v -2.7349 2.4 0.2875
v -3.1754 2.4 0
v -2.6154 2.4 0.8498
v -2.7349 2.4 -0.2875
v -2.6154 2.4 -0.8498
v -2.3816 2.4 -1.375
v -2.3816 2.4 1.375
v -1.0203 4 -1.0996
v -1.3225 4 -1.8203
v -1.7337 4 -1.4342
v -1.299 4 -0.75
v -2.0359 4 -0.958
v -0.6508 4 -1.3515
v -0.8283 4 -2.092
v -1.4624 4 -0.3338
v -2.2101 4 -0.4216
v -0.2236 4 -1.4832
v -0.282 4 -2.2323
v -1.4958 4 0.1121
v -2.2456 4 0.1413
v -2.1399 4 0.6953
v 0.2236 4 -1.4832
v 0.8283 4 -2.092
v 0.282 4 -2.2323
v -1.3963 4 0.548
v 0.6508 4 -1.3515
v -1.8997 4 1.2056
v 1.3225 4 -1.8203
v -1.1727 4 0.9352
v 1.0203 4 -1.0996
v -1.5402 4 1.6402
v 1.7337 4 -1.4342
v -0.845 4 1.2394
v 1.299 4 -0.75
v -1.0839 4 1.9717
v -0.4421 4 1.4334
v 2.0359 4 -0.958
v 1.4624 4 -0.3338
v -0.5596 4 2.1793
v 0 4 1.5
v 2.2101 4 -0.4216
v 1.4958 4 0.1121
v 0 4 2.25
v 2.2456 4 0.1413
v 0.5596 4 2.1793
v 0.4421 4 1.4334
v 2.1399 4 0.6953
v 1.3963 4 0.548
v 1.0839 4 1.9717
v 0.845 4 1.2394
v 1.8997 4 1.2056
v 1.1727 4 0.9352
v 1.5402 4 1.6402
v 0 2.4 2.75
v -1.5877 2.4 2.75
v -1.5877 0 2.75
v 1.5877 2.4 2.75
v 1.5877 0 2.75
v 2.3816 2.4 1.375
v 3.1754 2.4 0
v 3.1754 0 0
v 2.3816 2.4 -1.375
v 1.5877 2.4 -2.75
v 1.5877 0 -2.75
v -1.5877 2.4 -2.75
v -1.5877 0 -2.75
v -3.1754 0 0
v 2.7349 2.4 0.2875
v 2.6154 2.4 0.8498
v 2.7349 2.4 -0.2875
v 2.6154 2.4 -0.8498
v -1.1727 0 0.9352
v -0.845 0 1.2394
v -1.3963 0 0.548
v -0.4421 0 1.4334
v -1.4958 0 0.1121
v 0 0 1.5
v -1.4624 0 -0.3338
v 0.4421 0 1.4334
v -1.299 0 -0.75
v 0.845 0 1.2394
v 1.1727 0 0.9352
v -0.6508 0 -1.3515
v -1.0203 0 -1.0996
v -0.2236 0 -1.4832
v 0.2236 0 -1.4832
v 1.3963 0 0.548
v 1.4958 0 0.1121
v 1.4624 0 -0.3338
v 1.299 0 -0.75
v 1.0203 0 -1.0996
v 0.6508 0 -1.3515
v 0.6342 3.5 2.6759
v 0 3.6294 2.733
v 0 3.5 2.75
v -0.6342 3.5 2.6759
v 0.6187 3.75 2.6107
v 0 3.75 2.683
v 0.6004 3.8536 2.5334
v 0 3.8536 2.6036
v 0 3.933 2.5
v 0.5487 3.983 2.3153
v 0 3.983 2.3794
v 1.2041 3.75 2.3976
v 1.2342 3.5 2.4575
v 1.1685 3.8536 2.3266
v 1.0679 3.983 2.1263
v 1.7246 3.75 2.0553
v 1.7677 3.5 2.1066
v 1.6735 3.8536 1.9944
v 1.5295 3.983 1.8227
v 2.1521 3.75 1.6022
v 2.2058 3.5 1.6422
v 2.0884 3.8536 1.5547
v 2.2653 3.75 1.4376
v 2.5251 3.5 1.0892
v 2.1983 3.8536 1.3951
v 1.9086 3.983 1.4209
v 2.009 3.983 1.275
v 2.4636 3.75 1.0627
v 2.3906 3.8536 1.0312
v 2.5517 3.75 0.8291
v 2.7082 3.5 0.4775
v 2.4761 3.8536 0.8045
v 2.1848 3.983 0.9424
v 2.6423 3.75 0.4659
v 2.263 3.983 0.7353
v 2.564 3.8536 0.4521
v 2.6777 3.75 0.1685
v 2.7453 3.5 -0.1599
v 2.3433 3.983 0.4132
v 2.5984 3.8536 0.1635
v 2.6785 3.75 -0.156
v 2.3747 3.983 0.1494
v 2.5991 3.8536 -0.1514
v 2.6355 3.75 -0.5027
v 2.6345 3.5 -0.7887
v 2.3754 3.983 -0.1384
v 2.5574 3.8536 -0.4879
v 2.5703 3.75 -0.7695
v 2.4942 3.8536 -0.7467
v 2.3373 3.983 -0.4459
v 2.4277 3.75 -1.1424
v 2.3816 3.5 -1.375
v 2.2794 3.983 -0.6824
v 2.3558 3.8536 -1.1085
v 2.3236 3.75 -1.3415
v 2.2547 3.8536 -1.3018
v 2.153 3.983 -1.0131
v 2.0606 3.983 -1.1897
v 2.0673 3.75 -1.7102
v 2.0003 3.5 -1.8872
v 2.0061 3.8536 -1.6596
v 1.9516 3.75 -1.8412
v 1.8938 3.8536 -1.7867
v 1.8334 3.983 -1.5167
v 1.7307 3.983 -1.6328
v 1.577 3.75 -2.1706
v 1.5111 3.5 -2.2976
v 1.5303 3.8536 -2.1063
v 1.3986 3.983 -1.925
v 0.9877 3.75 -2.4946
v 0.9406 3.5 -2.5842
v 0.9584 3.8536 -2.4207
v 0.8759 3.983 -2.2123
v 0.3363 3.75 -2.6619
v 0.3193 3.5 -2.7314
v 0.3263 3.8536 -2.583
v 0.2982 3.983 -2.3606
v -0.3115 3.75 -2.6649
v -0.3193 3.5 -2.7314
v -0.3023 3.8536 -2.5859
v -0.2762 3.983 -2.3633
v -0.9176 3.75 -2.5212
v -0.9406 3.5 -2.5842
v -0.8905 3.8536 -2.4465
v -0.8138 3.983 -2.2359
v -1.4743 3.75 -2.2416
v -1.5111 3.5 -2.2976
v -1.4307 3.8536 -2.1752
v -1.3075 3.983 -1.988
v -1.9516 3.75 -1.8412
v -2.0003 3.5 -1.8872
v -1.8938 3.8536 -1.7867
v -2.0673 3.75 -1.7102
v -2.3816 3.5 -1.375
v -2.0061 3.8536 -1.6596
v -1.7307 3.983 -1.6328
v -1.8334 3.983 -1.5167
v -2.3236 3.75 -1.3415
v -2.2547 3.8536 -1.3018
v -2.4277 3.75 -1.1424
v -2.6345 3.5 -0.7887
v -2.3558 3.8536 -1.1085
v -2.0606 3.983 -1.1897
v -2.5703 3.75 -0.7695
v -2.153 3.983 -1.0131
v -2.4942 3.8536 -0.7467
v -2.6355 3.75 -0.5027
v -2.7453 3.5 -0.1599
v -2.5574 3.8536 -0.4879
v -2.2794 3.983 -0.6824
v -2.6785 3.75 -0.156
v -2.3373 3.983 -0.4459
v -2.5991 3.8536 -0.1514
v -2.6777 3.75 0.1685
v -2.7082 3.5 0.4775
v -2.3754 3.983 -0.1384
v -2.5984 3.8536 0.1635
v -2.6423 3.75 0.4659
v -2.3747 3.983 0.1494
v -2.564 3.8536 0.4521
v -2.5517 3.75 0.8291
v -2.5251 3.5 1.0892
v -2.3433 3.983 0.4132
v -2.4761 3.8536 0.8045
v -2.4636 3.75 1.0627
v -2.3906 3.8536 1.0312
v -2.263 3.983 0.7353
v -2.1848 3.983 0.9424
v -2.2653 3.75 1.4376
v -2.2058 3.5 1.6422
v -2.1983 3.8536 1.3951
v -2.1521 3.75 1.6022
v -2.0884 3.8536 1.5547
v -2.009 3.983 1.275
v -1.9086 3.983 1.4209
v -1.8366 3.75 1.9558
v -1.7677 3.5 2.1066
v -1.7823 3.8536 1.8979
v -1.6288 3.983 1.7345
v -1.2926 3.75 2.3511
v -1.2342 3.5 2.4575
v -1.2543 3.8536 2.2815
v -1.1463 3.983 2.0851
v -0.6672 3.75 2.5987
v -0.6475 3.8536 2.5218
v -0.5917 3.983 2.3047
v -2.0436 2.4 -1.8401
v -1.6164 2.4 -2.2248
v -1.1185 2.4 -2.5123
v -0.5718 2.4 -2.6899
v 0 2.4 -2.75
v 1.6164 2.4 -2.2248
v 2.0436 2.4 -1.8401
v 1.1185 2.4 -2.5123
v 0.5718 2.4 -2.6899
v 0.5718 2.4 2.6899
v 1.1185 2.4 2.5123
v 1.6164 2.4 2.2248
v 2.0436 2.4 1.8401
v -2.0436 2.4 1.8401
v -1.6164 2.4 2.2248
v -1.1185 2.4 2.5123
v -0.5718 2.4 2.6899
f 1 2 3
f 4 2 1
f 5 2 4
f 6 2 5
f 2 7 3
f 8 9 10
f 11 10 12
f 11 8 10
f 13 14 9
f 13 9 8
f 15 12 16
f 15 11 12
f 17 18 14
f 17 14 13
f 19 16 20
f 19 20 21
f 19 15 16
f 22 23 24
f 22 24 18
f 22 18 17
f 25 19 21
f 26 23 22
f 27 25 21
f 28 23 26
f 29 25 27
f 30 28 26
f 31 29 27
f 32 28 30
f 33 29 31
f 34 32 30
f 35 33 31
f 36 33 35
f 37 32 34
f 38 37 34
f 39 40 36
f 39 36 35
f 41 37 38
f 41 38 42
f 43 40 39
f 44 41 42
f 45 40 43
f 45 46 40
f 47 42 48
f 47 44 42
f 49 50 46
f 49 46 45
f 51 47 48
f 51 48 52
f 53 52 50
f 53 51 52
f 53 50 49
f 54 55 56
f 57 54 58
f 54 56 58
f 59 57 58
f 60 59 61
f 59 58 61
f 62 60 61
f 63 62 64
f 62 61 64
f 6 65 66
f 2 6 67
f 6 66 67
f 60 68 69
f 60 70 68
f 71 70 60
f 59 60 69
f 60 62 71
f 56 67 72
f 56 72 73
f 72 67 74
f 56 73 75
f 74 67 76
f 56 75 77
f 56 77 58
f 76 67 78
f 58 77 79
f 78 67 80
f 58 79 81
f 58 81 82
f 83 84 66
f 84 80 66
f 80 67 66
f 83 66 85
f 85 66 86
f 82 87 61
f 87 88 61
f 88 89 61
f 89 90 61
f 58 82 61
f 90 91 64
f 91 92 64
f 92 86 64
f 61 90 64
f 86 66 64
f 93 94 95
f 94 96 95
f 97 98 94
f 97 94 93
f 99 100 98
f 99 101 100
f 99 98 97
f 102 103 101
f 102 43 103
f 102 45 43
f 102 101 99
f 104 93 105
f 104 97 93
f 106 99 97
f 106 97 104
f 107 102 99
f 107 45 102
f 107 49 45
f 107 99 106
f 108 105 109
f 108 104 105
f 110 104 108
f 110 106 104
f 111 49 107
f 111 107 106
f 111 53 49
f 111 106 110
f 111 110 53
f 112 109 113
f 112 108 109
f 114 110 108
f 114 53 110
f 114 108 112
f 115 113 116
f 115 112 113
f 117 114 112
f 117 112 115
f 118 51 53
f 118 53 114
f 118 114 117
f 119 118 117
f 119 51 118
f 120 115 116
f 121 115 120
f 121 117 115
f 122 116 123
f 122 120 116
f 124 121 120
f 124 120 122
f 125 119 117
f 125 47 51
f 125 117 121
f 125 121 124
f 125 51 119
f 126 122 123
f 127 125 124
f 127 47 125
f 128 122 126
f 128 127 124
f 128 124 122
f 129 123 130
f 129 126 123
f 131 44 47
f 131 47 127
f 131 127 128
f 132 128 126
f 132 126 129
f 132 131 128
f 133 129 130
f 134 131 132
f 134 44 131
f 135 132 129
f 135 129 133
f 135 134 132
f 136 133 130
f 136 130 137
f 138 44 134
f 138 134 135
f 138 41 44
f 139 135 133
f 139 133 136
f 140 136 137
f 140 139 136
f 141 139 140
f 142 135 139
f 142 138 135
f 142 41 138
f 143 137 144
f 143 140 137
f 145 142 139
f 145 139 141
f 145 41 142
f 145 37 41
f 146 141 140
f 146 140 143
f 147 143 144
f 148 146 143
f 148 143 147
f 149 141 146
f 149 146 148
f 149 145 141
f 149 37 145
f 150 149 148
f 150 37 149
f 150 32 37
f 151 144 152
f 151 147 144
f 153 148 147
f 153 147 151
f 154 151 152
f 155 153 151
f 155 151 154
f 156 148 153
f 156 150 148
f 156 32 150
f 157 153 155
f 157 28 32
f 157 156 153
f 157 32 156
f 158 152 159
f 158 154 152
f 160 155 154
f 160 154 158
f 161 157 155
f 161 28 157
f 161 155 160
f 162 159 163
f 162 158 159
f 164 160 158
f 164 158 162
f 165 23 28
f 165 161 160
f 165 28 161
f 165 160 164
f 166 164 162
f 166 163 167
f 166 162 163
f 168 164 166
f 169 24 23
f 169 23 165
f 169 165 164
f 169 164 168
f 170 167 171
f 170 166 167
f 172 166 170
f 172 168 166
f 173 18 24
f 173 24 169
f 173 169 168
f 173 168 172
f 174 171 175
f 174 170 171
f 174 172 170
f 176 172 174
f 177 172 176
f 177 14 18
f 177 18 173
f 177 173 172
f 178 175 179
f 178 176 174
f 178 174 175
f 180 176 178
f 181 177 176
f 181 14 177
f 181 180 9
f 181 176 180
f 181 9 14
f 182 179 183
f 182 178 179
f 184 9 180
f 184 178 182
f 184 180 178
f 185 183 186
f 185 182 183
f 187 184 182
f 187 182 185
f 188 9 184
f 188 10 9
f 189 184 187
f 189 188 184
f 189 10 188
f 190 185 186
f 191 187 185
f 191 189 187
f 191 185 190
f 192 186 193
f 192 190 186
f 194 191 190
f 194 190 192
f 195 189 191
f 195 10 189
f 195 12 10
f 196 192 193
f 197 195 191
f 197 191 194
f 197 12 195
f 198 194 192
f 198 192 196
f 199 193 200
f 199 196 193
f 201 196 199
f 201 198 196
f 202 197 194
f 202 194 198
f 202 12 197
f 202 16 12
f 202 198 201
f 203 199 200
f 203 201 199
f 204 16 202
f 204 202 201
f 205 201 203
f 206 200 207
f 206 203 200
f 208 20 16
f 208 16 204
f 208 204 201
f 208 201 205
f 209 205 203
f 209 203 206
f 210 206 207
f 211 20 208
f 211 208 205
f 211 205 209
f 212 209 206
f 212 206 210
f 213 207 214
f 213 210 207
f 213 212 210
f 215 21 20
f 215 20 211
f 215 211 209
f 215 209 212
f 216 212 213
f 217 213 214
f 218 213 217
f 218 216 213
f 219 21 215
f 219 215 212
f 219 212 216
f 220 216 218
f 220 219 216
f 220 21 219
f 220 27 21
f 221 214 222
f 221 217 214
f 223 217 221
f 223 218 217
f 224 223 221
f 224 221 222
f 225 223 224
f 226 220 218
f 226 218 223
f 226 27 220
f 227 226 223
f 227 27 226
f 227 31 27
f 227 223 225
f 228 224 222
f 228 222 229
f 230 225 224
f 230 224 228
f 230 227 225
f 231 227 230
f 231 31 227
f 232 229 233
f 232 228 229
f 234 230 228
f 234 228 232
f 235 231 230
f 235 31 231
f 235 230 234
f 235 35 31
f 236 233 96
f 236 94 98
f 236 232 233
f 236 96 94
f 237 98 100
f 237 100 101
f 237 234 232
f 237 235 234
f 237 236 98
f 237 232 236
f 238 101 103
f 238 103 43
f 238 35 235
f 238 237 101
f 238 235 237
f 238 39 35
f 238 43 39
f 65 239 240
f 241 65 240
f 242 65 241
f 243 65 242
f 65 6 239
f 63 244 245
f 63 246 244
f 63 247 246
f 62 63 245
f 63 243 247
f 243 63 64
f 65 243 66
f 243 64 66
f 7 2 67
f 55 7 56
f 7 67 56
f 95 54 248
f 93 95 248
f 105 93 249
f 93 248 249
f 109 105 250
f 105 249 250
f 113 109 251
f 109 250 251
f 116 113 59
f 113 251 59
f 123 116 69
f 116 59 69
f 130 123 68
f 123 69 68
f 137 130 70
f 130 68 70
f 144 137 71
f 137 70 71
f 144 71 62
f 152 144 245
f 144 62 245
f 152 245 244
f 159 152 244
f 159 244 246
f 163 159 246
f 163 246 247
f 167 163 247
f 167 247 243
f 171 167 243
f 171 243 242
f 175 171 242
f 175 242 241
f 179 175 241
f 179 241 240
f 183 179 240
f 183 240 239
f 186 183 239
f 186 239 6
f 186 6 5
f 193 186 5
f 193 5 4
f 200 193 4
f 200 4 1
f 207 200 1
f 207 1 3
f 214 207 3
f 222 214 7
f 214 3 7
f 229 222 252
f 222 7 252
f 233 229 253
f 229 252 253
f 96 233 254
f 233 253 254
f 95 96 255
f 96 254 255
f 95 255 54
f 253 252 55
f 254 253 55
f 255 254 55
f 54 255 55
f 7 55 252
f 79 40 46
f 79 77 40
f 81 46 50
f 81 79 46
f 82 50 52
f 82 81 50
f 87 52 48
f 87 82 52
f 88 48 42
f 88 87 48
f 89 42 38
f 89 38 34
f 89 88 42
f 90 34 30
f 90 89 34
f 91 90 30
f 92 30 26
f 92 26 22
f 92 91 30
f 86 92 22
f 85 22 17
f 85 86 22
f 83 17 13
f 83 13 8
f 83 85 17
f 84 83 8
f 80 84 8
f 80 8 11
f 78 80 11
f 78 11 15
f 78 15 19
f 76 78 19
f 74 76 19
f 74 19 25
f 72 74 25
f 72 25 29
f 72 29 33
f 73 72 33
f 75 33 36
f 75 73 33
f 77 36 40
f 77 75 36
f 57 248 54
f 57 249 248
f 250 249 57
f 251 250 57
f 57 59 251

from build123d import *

# Parameters (mm, degrees)
ESQUISSE1_R        = 1.5
BOSS_EXTRU_1_DEPTH = 2.4
ESQUISSE2_R        = 2.75
ESQUISSE2_R_2      = 1.5
BOSS_EXTRU_2_DEPTH = 1.6
CONG_1_R           = 0.5


with BuildPart() as part:
    # Esquisse1 → Boss.-Extru.1 (new body)
    with BuildSketch(Plane(origin=(0, 0, 0), x_dir=(1, 0, 0), z_dir=(0, 1, 0))):
        Polygon((3.175426481, 0), (1.58771324, 2.75), (-1.58771324, 2.75), (-3.175426481, 0), (-1.58771324, -2.75), (1.58771324, -2.75), align=None)
        with Locations(Location((0, 0, 0), (0, 0, 270))):
            Circle(ESQUISSE1_R, mode=Mode.SUBTRACT)
    extrude(amount=BOSS_EXTRU_1_DEPTH)

    # Esquisse2 → Boss.-Extru.2 (add)
    with BuildSketch(Plane(origin=(0, 2.4, 0), x_dir=(1, 0, 0), z_dir=(0, 1, 0))):
        with Locations(Location((0, 0, 0), (0, 0, 270))):
            Circle(ESQUISSE2_R)
        with Locations(Location((0, 0, 0), (0, 0, 270))):
            Circle(ESQUISSE2_R_2, mode=Mode.SUBTRACT)
    extrude(amount=BOSS_EXTRU_2_DEPTH)

    # Congé1
    cong_1_edges = [part.edges().sort_by_distance(p)[0] for p in [
        (0, 4, -2.75),
    ]]
    fillet(cong_1_edges, radius=CONG_1_R)


solid = part.part
